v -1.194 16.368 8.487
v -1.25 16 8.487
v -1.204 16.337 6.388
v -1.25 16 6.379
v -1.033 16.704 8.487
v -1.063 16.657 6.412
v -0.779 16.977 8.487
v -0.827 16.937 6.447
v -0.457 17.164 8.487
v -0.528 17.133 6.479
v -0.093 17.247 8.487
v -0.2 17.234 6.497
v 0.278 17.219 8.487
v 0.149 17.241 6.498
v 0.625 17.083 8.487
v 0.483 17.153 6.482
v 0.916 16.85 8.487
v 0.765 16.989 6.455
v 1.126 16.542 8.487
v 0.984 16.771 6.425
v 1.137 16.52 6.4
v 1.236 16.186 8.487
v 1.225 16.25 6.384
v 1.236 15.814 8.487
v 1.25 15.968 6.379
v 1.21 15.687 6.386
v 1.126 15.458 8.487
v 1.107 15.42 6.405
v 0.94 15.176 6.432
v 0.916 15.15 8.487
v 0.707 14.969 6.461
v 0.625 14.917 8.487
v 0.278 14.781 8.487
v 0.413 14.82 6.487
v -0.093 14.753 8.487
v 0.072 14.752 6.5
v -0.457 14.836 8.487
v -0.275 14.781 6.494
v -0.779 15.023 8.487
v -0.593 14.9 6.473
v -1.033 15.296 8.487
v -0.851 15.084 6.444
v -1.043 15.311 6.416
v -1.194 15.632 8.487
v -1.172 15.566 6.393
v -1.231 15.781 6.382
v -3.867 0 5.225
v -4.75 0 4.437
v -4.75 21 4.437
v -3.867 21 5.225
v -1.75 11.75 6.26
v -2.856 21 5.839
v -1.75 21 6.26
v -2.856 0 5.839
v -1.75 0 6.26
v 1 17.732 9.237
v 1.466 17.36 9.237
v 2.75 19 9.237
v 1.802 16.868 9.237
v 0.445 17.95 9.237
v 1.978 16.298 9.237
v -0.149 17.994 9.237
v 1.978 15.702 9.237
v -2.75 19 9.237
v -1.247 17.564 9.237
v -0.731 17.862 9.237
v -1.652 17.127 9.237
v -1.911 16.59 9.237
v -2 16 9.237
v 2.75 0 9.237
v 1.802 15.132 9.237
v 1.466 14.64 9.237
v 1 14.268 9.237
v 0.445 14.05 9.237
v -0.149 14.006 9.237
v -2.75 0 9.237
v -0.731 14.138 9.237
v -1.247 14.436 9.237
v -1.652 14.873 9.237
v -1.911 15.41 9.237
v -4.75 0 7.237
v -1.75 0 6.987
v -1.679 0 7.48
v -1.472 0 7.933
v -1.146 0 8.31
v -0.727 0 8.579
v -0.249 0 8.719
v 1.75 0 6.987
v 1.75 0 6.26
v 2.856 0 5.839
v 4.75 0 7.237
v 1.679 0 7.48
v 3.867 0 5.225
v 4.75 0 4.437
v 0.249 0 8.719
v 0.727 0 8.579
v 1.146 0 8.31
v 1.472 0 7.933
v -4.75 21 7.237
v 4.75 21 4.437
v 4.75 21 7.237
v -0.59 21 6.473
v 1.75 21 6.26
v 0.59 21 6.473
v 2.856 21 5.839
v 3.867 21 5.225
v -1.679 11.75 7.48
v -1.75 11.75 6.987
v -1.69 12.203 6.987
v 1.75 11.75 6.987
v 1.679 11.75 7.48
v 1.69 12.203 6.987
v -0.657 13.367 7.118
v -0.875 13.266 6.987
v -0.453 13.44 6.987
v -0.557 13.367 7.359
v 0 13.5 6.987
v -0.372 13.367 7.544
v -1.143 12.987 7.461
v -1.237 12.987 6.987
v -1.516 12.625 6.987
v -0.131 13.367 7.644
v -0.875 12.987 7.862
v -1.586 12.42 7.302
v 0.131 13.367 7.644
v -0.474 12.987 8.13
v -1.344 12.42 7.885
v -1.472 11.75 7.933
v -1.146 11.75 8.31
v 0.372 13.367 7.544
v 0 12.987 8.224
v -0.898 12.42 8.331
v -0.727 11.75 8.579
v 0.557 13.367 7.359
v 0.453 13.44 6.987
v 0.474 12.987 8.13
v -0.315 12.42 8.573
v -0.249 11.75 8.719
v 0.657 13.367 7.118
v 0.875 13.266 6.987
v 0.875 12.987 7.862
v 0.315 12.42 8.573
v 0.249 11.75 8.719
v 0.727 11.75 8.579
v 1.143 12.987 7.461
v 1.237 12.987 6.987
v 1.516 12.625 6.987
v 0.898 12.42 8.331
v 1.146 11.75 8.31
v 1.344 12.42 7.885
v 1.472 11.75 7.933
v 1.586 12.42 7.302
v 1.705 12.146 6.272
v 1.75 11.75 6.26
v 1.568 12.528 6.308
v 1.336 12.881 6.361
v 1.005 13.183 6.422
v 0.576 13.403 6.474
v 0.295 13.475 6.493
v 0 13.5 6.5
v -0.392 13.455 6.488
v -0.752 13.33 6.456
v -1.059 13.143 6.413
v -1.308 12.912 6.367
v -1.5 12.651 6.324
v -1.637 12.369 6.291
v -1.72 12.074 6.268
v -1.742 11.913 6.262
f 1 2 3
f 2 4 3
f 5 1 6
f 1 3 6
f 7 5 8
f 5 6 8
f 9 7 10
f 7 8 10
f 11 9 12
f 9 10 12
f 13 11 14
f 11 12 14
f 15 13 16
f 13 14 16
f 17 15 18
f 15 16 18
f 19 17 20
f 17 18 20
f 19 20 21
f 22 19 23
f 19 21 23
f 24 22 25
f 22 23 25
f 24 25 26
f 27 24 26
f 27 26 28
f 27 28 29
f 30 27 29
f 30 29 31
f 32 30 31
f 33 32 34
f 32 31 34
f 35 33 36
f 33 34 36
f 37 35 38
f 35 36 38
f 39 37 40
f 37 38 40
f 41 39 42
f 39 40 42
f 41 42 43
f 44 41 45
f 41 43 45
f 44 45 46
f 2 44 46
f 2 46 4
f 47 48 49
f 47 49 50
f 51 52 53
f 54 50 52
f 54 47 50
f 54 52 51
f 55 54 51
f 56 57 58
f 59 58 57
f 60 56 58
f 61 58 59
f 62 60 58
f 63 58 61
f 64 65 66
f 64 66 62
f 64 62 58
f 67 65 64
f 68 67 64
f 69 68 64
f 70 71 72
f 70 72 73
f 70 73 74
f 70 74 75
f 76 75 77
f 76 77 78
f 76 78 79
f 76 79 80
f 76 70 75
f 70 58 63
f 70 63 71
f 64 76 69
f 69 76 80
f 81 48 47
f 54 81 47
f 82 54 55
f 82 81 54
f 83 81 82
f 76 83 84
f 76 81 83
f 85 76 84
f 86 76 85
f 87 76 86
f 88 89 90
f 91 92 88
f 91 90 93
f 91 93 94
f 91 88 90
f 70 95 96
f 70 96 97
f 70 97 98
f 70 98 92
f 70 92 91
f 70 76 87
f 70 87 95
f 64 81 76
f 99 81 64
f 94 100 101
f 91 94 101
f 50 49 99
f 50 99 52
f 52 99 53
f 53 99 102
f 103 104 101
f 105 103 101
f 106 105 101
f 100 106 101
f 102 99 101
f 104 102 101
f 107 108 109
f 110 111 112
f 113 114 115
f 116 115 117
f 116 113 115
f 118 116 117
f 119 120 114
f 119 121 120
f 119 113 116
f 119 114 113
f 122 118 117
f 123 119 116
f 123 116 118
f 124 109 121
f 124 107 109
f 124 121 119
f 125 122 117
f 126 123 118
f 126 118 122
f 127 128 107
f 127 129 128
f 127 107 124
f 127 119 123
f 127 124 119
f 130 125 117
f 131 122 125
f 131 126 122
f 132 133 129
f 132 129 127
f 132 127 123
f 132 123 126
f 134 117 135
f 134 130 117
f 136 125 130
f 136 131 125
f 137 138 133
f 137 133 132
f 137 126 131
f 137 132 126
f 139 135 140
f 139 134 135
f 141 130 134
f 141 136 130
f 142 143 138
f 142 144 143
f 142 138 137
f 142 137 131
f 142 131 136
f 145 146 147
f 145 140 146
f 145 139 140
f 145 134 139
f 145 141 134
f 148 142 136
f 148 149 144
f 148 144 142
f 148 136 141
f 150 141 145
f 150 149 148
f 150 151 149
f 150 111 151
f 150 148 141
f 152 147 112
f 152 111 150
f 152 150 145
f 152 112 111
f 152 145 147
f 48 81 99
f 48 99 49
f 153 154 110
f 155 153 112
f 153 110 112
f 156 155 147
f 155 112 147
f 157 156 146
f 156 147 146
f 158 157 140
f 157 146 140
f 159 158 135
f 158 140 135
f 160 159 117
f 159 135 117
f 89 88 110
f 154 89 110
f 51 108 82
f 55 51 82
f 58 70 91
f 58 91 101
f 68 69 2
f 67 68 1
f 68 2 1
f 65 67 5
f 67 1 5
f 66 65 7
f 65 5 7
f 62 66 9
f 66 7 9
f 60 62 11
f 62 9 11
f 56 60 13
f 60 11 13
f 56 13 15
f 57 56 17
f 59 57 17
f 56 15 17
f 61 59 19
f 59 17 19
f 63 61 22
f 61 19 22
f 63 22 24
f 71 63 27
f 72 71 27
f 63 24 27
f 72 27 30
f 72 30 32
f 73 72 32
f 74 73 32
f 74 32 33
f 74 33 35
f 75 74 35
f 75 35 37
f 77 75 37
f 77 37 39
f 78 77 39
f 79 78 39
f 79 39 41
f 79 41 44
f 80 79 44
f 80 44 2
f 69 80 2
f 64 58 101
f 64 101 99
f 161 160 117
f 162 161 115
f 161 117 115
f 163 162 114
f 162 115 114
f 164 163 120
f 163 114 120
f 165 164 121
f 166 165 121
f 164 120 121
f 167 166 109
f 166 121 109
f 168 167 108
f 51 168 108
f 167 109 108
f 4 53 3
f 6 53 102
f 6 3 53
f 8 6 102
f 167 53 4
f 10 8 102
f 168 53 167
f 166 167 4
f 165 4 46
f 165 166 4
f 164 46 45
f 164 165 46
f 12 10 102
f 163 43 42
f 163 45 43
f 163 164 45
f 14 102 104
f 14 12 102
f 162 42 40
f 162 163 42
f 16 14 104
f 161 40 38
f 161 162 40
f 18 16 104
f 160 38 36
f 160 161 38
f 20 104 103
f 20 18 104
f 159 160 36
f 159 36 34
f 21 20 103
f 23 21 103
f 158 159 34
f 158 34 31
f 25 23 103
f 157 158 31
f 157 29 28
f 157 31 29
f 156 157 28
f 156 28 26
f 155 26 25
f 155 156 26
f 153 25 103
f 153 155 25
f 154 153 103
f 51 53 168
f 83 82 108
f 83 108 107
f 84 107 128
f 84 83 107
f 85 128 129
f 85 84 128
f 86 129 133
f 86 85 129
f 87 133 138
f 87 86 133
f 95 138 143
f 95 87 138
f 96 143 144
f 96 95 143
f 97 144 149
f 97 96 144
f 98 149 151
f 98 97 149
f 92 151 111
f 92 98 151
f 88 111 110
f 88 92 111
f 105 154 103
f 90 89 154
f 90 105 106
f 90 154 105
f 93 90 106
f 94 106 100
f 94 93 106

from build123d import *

# Parameters (mm, degrees)
F6_DEPTH        = 21
F7_SIZE         = 2
F8_SIZE         = 2
F12_DEPTH       = 2.5510001
F14_D           = 2.5
F14_CSINK_D     = 4
F14_CSINK_ANGLE = 90


# Not quite as in the source:
# - a feature names something its author has since deleted; it is built from what else it names


with BuildPart() as f6:
    # F5 (on Front) → F6 (new body)
    with BuildSketch(Plane.XZ):
        with BuildLine():
            ThreePointArc((1.75, 6.2599920128), (3.3753918927, 5.5548833985), (4.75, 4.4370598373))
            Line((4.75, 4.4370598373), (4.75, 9.2370598373))
            Line((4.75, 9.2370598373), (-4.75, 9.2370598373))
            Line((-4.75, 9.2370598373), (-4.75, 4.4370598373))
            ThreePointArc((-4.75, 4.4370598373), (-3.3753918927, 5.5548833985), (-1.75, 6.2599920128))
            Line((-1.75, 6.2599920128), (-1.75, 6.9870598373))
            ThreePointArc((-1.75, 6.9870598373), (0, 8.7370598373), (1.75, 6.9870598373))
            Line((1.75, 6.9870598373), (1.75, 6.2599920128))
        make_face()
        with BuildLine():
            ThreePointArc((-1.75, 6.2599920128), (0, 6.5), (1.75, 6.2599920128))
            Line((1.75, 6.2599920128), (1.75, 6.9870598373))
            ThreePointArc((1.75, 6.9870598373), (0, 8.7370598373), (-1.75, 6.9870598373))
            Line((-1.75, 6.9870598373), (-1.75, 6.2599920128))
        make_face()
    extrude(amount=-F6_DEPTH)

    # F7
    f7_edges = [f6.edges().sort_by_distance(p)[0] for p in [
        (-4.75, 10.5, 9.23706),
        (4.75, 10.5, 9.23706),
    ]]
    chamfer(f7_edges, length=F7_SIZE)

    # F8
    f8_edges = [f6.edges().sort_by_distance(p)[0] for p in [
        (0, 21, 9.23706),
    ]]
    chamfer(f8_edges, length=F8_SIZE)

    # F10 (on offset) → F11 (revolve, cut)
    with BuildSketch(Plane.XY.offset(6.9870598373)):
        with BuildLine():
            Line((-1.75, 11.75), (-1.75, 0))
            Line((-1.75, 0), (0, 0))
            Line((0, 0), (0, 13.5))
            ThreePointArc((0, 13.5), (-1.2374368671, 12.9874368671), (-1.75, 11.75))
        make_face()
    revolve(axis=Axis((0, 6.75, 6.9870598373), (0, 1, 0)), mode=Mode.SUBTRACT)

    # F10 (on offset) → F12 (cut, through all)
    with BuildSketch(Plane.XY.offset(6.9870598373)):
        with BuildLine():
            Line((0, 13.5), (0, 0))
            Line((0, 0), (1.75, 0))
            Line((1.75, 0), (1.75, 11.75))
            ThreePointArc((1.75, 11.75), (1.2374368671, 12.9874368671), (0, 13.5))
        make_face()
        with BuildLine():
            Line((-1.75, 11.75), (-1.75, 0))
            Line((-1.75, 0), (0, 0))
            Line((0, 0), (0, 13.5))
            ThreePointArc((0, 13.5), (-1.2374368671, 12.9874368671), (-1.75, 11.75))
        make_face()
    extrude(amount=-F12_DEPTH, mode=Mode.SUBTRACT)

    # F14 (through all)
    with Locations(Plane.XY.offset(9.2370598373)):
        with Locations((0, 16)):
            CounterSinkHole(F14_D / 2, F14_CSINK_D / 2, counter_sink_angle=F14_CSINK_ANGLE)


solid = f6.part
